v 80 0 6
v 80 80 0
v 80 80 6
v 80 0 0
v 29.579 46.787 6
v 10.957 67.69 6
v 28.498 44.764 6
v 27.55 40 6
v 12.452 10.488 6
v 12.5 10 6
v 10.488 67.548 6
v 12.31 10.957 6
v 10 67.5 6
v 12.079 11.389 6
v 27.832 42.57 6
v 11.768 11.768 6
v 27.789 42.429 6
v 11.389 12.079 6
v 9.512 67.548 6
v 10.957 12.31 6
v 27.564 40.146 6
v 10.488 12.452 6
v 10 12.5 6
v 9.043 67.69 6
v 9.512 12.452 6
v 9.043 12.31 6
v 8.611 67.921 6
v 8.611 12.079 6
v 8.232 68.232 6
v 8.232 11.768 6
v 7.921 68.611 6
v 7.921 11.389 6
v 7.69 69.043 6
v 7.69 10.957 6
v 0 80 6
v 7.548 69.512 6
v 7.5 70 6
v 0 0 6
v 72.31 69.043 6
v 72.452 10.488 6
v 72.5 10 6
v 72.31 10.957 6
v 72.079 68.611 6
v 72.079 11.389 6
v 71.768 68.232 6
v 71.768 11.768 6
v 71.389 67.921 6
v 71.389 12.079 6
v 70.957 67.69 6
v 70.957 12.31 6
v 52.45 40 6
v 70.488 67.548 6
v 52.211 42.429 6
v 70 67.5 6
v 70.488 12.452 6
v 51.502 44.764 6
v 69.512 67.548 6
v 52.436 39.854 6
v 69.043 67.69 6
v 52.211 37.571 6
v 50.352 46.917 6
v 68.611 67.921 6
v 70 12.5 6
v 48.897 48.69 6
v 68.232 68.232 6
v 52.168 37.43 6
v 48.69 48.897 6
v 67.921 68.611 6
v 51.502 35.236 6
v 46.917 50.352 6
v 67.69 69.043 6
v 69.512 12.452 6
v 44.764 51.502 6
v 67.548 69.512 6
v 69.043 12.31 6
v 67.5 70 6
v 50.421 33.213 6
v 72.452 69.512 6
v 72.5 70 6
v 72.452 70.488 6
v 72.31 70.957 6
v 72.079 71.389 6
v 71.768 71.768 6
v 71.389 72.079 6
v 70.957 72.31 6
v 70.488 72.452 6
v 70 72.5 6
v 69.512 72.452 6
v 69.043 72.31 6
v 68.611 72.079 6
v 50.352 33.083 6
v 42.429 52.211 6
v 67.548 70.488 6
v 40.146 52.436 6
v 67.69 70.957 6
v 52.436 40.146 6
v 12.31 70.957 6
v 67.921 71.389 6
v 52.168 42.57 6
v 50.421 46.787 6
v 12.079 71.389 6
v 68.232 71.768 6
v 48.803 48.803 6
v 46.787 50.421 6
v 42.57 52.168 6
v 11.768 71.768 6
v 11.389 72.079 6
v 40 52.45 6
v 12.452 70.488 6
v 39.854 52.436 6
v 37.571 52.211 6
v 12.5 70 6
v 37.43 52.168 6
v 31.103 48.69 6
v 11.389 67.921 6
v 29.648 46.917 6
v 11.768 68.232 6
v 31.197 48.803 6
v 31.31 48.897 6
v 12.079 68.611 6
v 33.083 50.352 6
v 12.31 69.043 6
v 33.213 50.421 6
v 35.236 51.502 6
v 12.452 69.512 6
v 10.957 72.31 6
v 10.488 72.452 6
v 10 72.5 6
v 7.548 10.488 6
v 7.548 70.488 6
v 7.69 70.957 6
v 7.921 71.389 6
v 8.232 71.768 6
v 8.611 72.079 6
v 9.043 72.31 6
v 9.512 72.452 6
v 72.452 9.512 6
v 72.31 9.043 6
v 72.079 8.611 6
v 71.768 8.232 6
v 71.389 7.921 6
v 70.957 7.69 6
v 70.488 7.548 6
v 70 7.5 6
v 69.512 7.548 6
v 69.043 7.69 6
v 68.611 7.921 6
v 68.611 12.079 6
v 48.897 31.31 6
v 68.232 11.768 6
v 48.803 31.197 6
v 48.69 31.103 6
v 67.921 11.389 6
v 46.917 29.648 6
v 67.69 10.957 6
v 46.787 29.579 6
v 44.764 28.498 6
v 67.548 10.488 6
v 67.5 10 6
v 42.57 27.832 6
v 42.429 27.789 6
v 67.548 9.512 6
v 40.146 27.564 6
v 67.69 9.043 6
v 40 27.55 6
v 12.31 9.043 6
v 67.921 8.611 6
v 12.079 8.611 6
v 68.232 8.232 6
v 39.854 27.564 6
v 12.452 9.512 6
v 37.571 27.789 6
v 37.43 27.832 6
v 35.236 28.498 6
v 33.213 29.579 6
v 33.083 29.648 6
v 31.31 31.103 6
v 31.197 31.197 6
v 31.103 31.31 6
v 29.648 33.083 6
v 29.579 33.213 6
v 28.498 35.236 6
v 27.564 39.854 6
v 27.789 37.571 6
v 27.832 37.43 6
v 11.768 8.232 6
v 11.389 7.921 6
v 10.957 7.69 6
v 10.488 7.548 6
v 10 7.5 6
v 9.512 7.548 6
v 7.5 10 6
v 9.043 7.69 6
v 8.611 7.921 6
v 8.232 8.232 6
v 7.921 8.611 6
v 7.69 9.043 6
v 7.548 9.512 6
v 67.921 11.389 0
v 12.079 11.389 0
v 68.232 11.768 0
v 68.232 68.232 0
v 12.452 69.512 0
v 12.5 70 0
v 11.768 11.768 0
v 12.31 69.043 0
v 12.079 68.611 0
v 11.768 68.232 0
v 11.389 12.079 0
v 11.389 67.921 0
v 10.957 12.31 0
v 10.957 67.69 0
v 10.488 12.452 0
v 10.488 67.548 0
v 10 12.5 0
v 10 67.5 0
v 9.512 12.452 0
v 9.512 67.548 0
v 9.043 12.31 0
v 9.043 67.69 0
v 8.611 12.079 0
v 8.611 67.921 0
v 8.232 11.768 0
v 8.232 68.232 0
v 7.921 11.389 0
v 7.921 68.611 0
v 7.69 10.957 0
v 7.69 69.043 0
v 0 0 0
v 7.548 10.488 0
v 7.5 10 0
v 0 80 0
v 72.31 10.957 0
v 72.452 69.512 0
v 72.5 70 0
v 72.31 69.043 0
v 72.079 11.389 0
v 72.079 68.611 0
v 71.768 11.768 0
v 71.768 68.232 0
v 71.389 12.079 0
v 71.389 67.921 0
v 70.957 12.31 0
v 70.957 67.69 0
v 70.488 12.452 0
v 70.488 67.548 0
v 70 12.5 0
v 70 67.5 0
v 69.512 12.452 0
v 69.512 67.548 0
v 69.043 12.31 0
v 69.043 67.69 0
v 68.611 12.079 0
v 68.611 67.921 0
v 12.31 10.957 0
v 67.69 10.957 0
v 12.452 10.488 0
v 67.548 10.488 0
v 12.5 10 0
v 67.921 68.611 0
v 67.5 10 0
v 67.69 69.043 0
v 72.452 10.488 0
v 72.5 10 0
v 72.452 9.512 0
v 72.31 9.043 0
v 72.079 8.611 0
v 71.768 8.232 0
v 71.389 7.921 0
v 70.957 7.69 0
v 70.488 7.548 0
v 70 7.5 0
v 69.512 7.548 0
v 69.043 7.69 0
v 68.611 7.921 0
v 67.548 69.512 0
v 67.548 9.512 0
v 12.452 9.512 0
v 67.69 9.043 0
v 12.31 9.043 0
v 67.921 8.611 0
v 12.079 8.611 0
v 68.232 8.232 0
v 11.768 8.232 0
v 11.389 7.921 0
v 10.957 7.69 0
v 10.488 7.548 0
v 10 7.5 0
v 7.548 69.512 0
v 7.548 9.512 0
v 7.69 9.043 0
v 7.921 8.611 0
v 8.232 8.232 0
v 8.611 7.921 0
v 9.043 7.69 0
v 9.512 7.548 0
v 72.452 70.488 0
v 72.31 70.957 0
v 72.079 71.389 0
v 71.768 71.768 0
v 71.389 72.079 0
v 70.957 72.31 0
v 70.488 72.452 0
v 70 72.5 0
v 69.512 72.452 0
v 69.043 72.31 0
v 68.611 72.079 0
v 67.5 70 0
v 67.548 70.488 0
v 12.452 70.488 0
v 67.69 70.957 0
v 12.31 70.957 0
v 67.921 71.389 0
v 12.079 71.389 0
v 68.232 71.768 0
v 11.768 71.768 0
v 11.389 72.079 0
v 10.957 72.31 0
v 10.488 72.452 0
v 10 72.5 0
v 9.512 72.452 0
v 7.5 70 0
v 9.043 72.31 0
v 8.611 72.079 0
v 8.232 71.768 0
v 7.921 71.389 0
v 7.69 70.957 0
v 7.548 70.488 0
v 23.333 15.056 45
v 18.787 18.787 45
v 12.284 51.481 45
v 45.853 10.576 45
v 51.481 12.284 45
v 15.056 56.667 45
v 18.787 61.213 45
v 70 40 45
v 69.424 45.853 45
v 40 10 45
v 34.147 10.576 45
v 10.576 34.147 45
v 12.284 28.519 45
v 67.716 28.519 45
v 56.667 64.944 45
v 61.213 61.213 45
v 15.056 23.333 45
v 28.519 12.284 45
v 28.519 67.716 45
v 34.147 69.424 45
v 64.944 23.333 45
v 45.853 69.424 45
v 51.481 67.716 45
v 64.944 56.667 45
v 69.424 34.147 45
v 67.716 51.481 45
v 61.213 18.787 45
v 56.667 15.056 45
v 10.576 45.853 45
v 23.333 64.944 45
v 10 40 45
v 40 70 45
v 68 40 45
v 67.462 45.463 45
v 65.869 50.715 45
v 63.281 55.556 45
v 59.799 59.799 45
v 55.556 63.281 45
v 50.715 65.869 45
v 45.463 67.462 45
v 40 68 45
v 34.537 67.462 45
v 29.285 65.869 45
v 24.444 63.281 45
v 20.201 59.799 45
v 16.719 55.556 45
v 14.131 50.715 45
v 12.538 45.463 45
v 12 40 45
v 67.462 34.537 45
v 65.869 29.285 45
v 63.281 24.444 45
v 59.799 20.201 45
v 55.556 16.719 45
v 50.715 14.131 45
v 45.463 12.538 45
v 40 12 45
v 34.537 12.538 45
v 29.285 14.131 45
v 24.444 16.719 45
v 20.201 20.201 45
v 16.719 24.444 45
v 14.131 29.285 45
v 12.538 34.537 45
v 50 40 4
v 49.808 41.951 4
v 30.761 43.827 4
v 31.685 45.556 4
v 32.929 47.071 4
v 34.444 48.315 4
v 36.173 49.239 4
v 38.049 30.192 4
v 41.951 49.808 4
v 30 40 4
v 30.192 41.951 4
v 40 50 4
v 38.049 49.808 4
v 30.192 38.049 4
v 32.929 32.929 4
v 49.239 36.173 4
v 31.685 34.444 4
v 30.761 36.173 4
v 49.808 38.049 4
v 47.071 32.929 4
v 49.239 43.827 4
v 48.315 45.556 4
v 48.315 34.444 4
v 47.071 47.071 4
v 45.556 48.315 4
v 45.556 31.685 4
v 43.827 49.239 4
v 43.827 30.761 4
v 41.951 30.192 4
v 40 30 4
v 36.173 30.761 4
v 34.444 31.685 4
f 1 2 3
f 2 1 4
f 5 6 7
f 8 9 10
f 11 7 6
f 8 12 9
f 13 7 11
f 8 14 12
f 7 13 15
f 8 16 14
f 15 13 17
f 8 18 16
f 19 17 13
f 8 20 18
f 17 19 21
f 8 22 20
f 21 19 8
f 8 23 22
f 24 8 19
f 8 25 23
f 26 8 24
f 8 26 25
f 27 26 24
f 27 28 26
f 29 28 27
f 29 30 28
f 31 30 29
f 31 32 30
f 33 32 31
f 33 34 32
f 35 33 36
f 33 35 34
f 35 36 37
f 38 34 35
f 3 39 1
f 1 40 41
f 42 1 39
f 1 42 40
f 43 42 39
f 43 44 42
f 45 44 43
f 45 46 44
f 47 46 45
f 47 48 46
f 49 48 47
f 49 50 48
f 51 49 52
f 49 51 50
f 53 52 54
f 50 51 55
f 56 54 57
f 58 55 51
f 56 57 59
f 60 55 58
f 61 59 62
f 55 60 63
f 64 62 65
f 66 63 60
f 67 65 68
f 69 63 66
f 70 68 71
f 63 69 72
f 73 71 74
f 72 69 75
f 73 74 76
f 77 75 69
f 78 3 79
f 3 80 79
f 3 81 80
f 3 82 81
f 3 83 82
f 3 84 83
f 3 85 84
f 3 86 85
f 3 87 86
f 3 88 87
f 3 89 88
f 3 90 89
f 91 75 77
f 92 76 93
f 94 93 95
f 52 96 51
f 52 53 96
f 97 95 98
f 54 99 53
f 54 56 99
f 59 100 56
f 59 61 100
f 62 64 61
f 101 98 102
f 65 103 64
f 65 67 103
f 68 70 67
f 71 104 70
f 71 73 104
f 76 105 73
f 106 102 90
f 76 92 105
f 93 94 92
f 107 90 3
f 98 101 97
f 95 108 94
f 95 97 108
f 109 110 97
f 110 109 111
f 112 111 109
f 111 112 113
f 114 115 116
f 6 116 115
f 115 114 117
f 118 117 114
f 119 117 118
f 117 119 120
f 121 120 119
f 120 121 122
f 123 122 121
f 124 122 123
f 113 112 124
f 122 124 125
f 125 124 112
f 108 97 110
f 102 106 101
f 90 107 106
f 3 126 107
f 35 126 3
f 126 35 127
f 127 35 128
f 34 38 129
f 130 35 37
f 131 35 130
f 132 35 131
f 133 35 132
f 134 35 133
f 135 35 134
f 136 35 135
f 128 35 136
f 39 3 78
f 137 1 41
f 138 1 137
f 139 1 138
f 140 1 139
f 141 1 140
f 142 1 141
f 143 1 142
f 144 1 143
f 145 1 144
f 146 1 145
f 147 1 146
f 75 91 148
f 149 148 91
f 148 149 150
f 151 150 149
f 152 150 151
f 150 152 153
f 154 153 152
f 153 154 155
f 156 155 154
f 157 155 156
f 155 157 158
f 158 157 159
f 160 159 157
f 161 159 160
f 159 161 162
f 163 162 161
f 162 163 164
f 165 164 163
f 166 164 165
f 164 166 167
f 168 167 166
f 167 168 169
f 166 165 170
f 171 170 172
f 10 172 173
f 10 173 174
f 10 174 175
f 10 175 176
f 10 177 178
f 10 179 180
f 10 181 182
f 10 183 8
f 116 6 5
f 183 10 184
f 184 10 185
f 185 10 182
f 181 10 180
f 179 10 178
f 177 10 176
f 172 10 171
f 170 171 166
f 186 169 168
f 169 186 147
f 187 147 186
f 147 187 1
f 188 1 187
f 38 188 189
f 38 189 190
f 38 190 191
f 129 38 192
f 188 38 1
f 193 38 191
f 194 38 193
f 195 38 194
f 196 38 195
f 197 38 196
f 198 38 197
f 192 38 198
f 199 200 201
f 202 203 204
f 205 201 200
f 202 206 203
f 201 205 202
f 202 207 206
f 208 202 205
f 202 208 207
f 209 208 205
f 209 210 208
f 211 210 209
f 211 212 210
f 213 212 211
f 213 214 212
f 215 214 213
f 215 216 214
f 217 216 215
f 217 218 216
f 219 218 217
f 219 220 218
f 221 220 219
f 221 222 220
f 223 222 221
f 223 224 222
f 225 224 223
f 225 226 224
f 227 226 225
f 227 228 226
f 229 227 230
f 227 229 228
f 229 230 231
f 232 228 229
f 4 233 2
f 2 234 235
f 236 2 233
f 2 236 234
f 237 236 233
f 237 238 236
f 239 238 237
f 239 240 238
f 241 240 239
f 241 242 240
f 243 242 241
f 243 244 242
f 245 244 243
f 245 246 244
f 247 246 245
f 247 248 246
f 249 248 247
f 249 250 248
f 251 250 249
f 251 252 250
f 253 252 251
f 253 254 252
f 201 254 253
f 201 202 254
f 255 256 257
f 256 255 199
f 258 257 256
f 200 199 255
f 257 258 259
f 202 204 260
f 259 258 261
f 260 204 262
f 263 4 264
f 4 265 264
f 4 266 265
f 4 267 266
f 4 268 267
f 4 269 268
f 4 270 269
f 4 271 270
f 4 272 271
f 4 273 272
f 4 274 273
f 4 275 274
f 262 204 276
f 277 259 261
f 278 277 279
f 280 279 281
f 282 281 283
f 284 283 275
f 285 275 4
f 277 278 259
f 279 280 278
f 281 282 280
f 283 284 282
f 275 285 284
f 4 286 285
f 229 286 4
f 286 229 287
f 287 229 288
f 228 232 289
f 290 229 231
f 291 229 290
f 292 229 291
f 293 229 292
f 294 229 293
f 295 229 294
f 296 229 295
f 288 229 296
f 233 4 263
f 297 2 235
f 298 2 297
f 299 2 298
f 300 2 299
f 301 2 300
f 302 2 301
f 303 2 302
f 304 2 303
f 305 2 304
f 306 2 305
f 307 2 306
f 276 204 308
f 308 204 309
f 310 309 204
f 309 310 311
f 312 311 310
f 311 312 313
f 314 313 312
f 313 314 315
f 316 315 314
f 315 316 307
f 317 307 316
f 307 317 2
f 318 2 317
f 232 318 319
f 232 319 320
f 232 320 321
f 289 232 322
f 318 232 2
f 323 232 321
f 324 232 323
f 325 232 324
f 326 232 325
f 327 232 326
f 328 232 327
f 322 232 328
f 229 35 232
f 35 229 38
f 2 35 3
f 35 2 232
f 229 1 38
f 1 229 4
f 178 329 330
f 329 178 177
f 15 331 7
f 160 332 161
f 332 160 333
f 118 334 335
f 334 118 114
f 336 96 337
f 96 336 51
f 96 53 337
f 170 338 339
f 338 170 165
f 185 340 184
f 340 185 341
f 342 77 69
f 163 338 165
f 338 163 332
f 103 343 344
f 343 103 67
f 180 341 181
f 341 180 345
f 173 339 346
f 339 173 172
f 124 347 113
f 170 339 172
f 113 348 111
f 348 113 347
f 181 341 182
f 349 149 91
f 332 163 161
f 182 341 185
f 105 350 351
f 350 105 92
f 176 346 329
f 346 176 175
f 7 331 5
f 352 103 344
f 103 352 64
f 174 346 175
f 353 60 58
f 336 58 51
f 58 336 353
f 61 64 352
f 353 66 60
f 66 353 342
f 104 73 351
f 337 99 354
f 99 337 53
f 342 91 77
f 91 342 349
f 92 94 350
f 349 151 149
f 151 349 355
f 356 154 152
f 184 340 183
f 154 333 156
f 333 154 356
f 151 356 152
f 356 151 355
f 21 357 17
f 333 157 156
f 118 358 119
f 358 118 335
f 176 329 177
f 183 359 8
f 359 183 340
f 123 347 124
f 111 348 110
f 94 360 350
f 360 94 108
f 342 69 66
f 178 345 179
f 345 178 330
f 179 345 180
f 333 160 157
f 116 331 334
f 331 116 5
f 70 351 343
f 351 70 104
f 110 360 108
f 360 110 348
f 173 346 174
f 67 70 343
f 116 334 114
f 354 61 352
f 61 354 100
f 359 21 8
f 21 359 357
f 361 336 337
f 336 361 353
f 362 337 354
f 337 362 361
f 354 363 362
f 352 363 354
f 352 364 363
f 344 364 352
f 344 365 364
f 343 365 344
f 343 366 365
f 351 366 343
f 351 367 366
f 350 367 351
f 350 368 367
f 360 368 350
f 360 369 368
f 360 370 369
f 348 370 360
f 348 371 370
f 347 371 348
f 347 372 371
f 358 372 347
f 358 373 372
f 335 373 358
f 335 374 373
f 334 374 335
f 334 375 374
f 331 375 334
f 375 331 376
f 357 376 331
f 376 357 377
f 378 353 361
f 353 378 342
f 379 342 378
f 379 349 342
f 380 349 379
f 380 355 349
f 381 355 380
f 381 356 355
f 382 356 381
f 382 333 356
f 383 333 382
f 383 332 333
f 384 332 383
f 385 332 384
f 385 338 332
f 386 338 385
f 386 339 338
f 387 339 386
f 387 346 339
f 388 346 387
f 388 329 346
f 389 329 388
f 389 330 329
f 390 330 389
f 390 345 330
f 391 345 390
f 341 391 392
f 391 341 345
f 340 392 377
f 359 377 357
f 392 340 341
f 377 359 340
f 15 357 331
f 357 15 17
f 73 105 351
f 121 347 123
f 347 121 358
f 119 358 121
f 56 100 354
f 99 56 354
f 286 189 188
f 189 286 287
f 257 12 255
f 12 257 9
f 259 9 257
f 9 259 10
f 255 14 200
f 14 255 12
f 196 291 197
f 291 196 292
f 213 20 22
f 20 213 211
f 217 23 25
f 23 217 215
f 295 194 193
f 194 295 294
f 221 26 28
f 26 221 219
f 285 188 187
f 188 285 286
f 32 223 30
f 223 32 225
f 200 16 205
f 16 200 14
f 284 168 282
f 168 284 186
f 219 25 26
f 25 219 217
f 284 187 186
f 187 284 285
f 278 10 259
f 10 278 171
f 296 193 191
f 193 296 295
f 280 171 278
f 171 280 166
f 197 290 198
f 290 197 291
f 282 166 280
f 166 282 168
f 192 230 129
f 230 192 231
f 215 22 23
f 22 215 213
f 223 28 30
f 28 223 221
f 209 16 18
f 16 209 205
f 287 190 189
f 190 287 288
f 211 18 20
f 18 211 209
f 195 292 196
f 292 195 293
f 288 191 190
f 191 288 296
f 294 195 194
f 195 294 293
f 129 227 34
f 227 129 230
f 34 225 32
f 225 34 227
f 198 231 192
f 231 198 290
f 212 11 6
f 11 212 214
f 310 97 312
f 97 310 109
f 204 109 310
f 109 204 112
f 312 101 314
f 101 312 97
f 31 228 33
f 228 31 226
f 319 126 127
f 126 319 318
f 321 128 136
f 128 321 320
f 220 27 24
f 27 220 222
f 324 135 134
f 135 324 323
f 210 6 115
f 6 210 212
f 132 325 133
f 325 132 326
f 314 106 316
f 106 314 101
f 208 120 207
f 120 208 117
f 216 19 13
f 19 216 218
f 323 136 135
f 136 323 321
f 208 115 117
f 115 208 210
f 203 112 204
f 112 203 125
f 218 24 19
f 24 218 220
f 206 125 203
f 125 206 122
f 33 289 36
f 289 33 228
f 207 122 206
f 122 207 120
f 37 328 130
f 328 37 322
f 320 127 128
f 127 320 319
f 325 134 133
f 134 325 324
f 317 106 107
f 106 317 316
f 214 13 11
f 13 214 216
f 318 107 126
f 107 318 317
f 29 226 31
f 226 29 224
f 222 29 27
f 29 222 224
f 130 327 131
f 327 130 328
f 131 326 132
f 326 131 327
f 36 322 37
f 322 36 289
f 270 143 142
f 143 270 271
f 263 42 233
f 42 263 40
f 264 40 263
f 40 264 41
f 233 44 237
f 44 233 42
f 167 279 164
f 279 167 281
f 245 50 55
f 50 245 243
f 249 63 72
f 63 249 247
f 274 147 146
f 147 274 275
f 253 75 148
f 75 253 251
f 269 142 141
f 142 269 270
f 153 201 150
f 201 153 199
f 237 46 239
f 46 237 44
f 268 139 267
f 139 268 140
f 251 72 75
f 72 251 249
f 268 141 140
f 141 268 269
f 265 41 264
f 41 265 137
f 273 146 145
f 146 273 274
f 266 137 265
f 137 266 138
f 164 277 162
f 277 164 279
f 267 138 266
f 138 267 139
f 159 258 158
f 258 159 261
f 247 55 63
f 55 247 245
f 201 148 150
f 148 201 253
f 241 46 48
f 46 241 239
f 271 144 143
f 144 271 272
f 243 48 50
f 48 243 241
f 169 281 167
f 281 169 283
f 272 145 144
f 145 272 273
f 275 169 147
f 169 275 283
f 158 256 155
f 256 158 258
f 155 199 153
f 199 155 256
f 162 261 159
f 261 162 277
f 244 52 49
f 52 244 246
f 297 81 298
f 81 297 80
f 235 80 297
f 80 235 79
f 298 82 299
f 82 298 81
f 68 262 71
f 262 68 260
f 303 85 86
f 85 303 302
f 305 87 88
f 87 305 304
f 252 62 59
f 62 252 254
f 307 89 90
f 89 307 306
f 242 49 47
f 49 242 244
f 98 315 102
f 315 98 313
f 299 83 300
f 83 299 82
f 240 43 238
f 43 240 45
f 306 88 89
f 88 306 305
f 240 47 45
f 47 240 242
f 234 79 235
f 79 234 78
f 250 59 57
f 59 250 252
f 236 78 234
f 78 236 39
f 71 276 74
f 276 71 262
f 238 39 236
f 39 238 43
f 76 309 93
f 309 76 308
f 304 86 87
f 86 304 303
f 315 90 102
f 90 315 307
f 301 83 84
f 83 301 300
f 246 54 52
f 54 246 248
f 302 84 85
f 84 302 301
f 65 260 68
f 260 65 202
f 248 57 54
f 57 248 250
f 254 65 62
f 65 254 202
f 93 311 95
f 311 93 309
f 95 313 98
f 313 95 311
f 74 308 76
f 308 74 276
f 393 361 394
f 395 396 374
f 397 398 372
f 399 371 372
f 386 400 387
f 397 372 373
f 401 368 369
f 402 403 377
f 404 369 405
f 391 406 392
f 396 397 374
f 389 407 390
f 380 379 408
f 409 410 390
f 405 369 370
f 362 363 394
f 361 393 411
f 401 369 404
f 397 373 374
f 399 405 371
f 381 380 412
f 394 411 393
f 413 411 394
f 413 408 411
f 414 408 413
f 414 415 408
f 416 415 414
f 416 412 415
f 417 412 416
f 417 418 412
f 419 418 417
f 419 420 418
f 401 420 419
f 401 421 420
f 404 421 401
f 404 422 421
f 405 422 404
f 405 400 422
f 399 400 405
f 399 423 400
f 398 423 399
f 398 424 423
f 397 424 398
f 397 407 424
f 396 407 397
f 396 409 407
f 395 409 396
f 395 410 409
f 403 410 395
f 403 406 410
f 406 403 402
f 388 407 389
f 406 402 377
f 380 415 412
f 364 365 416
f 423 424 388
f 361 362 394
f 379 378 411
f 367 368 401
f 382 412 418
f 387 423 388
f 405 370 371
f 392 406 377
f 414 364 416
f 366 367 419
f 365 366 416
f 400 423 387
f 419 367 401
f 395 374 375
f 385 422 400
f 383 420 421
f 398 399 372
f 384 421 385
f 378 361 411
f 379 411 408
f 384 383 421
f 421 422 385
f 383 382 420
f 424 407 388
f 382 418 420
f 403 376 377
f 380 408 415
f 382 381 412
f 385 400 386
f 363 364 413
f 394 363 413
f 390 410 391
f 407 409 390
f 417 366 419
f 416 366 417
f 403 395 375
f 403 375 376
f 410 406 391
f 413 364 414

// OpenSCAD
$fn = 32;

// ----------------------------------------------------------------------
// Hopper: flanged with square flange
// ----------------------------------------------------------------------

// --- parameters (mm) ---
fl = 80;                  // flange side, X and Y
fl_t = 6;                 // flange thickness
cone_h = 40;              // cone height above the flange
top_d = 60;               // cone mouth diameter
bot_d = 24;               // cone spout diameter
wall = 2;                 // cone wall thickness
hole_r = 2.5;             // flange hole radius
hole_in = 10;             // hole inset from the corners

bore_d = bot_d - 2 * wall;  // spout bore diameter
total_h = fl_t + cone_h - 1;  // overall height

difference() {
  union() {
    cube([fl, fl, fl_t]);
    translate([fl / 2, fl / 2, fl_t - 1])
      cylinder(h = cone_h, d1 = bot_d, d2 = top_d);
  }
  translate([fl / 2, fl / 2, fl_t - 2])
    cylinder(h = cone_h + 1, d1 = bore_d, d2 = top_d - 2 * wall);
  for (sx = [0, 1], sy = [0, 1])
    translate([sx ? fl - hole_in : hole_in,
               sy ? fl - hole_in : hole_in, -1])
      cylinder(r = hole_r, h = fl_t + 2);
}
